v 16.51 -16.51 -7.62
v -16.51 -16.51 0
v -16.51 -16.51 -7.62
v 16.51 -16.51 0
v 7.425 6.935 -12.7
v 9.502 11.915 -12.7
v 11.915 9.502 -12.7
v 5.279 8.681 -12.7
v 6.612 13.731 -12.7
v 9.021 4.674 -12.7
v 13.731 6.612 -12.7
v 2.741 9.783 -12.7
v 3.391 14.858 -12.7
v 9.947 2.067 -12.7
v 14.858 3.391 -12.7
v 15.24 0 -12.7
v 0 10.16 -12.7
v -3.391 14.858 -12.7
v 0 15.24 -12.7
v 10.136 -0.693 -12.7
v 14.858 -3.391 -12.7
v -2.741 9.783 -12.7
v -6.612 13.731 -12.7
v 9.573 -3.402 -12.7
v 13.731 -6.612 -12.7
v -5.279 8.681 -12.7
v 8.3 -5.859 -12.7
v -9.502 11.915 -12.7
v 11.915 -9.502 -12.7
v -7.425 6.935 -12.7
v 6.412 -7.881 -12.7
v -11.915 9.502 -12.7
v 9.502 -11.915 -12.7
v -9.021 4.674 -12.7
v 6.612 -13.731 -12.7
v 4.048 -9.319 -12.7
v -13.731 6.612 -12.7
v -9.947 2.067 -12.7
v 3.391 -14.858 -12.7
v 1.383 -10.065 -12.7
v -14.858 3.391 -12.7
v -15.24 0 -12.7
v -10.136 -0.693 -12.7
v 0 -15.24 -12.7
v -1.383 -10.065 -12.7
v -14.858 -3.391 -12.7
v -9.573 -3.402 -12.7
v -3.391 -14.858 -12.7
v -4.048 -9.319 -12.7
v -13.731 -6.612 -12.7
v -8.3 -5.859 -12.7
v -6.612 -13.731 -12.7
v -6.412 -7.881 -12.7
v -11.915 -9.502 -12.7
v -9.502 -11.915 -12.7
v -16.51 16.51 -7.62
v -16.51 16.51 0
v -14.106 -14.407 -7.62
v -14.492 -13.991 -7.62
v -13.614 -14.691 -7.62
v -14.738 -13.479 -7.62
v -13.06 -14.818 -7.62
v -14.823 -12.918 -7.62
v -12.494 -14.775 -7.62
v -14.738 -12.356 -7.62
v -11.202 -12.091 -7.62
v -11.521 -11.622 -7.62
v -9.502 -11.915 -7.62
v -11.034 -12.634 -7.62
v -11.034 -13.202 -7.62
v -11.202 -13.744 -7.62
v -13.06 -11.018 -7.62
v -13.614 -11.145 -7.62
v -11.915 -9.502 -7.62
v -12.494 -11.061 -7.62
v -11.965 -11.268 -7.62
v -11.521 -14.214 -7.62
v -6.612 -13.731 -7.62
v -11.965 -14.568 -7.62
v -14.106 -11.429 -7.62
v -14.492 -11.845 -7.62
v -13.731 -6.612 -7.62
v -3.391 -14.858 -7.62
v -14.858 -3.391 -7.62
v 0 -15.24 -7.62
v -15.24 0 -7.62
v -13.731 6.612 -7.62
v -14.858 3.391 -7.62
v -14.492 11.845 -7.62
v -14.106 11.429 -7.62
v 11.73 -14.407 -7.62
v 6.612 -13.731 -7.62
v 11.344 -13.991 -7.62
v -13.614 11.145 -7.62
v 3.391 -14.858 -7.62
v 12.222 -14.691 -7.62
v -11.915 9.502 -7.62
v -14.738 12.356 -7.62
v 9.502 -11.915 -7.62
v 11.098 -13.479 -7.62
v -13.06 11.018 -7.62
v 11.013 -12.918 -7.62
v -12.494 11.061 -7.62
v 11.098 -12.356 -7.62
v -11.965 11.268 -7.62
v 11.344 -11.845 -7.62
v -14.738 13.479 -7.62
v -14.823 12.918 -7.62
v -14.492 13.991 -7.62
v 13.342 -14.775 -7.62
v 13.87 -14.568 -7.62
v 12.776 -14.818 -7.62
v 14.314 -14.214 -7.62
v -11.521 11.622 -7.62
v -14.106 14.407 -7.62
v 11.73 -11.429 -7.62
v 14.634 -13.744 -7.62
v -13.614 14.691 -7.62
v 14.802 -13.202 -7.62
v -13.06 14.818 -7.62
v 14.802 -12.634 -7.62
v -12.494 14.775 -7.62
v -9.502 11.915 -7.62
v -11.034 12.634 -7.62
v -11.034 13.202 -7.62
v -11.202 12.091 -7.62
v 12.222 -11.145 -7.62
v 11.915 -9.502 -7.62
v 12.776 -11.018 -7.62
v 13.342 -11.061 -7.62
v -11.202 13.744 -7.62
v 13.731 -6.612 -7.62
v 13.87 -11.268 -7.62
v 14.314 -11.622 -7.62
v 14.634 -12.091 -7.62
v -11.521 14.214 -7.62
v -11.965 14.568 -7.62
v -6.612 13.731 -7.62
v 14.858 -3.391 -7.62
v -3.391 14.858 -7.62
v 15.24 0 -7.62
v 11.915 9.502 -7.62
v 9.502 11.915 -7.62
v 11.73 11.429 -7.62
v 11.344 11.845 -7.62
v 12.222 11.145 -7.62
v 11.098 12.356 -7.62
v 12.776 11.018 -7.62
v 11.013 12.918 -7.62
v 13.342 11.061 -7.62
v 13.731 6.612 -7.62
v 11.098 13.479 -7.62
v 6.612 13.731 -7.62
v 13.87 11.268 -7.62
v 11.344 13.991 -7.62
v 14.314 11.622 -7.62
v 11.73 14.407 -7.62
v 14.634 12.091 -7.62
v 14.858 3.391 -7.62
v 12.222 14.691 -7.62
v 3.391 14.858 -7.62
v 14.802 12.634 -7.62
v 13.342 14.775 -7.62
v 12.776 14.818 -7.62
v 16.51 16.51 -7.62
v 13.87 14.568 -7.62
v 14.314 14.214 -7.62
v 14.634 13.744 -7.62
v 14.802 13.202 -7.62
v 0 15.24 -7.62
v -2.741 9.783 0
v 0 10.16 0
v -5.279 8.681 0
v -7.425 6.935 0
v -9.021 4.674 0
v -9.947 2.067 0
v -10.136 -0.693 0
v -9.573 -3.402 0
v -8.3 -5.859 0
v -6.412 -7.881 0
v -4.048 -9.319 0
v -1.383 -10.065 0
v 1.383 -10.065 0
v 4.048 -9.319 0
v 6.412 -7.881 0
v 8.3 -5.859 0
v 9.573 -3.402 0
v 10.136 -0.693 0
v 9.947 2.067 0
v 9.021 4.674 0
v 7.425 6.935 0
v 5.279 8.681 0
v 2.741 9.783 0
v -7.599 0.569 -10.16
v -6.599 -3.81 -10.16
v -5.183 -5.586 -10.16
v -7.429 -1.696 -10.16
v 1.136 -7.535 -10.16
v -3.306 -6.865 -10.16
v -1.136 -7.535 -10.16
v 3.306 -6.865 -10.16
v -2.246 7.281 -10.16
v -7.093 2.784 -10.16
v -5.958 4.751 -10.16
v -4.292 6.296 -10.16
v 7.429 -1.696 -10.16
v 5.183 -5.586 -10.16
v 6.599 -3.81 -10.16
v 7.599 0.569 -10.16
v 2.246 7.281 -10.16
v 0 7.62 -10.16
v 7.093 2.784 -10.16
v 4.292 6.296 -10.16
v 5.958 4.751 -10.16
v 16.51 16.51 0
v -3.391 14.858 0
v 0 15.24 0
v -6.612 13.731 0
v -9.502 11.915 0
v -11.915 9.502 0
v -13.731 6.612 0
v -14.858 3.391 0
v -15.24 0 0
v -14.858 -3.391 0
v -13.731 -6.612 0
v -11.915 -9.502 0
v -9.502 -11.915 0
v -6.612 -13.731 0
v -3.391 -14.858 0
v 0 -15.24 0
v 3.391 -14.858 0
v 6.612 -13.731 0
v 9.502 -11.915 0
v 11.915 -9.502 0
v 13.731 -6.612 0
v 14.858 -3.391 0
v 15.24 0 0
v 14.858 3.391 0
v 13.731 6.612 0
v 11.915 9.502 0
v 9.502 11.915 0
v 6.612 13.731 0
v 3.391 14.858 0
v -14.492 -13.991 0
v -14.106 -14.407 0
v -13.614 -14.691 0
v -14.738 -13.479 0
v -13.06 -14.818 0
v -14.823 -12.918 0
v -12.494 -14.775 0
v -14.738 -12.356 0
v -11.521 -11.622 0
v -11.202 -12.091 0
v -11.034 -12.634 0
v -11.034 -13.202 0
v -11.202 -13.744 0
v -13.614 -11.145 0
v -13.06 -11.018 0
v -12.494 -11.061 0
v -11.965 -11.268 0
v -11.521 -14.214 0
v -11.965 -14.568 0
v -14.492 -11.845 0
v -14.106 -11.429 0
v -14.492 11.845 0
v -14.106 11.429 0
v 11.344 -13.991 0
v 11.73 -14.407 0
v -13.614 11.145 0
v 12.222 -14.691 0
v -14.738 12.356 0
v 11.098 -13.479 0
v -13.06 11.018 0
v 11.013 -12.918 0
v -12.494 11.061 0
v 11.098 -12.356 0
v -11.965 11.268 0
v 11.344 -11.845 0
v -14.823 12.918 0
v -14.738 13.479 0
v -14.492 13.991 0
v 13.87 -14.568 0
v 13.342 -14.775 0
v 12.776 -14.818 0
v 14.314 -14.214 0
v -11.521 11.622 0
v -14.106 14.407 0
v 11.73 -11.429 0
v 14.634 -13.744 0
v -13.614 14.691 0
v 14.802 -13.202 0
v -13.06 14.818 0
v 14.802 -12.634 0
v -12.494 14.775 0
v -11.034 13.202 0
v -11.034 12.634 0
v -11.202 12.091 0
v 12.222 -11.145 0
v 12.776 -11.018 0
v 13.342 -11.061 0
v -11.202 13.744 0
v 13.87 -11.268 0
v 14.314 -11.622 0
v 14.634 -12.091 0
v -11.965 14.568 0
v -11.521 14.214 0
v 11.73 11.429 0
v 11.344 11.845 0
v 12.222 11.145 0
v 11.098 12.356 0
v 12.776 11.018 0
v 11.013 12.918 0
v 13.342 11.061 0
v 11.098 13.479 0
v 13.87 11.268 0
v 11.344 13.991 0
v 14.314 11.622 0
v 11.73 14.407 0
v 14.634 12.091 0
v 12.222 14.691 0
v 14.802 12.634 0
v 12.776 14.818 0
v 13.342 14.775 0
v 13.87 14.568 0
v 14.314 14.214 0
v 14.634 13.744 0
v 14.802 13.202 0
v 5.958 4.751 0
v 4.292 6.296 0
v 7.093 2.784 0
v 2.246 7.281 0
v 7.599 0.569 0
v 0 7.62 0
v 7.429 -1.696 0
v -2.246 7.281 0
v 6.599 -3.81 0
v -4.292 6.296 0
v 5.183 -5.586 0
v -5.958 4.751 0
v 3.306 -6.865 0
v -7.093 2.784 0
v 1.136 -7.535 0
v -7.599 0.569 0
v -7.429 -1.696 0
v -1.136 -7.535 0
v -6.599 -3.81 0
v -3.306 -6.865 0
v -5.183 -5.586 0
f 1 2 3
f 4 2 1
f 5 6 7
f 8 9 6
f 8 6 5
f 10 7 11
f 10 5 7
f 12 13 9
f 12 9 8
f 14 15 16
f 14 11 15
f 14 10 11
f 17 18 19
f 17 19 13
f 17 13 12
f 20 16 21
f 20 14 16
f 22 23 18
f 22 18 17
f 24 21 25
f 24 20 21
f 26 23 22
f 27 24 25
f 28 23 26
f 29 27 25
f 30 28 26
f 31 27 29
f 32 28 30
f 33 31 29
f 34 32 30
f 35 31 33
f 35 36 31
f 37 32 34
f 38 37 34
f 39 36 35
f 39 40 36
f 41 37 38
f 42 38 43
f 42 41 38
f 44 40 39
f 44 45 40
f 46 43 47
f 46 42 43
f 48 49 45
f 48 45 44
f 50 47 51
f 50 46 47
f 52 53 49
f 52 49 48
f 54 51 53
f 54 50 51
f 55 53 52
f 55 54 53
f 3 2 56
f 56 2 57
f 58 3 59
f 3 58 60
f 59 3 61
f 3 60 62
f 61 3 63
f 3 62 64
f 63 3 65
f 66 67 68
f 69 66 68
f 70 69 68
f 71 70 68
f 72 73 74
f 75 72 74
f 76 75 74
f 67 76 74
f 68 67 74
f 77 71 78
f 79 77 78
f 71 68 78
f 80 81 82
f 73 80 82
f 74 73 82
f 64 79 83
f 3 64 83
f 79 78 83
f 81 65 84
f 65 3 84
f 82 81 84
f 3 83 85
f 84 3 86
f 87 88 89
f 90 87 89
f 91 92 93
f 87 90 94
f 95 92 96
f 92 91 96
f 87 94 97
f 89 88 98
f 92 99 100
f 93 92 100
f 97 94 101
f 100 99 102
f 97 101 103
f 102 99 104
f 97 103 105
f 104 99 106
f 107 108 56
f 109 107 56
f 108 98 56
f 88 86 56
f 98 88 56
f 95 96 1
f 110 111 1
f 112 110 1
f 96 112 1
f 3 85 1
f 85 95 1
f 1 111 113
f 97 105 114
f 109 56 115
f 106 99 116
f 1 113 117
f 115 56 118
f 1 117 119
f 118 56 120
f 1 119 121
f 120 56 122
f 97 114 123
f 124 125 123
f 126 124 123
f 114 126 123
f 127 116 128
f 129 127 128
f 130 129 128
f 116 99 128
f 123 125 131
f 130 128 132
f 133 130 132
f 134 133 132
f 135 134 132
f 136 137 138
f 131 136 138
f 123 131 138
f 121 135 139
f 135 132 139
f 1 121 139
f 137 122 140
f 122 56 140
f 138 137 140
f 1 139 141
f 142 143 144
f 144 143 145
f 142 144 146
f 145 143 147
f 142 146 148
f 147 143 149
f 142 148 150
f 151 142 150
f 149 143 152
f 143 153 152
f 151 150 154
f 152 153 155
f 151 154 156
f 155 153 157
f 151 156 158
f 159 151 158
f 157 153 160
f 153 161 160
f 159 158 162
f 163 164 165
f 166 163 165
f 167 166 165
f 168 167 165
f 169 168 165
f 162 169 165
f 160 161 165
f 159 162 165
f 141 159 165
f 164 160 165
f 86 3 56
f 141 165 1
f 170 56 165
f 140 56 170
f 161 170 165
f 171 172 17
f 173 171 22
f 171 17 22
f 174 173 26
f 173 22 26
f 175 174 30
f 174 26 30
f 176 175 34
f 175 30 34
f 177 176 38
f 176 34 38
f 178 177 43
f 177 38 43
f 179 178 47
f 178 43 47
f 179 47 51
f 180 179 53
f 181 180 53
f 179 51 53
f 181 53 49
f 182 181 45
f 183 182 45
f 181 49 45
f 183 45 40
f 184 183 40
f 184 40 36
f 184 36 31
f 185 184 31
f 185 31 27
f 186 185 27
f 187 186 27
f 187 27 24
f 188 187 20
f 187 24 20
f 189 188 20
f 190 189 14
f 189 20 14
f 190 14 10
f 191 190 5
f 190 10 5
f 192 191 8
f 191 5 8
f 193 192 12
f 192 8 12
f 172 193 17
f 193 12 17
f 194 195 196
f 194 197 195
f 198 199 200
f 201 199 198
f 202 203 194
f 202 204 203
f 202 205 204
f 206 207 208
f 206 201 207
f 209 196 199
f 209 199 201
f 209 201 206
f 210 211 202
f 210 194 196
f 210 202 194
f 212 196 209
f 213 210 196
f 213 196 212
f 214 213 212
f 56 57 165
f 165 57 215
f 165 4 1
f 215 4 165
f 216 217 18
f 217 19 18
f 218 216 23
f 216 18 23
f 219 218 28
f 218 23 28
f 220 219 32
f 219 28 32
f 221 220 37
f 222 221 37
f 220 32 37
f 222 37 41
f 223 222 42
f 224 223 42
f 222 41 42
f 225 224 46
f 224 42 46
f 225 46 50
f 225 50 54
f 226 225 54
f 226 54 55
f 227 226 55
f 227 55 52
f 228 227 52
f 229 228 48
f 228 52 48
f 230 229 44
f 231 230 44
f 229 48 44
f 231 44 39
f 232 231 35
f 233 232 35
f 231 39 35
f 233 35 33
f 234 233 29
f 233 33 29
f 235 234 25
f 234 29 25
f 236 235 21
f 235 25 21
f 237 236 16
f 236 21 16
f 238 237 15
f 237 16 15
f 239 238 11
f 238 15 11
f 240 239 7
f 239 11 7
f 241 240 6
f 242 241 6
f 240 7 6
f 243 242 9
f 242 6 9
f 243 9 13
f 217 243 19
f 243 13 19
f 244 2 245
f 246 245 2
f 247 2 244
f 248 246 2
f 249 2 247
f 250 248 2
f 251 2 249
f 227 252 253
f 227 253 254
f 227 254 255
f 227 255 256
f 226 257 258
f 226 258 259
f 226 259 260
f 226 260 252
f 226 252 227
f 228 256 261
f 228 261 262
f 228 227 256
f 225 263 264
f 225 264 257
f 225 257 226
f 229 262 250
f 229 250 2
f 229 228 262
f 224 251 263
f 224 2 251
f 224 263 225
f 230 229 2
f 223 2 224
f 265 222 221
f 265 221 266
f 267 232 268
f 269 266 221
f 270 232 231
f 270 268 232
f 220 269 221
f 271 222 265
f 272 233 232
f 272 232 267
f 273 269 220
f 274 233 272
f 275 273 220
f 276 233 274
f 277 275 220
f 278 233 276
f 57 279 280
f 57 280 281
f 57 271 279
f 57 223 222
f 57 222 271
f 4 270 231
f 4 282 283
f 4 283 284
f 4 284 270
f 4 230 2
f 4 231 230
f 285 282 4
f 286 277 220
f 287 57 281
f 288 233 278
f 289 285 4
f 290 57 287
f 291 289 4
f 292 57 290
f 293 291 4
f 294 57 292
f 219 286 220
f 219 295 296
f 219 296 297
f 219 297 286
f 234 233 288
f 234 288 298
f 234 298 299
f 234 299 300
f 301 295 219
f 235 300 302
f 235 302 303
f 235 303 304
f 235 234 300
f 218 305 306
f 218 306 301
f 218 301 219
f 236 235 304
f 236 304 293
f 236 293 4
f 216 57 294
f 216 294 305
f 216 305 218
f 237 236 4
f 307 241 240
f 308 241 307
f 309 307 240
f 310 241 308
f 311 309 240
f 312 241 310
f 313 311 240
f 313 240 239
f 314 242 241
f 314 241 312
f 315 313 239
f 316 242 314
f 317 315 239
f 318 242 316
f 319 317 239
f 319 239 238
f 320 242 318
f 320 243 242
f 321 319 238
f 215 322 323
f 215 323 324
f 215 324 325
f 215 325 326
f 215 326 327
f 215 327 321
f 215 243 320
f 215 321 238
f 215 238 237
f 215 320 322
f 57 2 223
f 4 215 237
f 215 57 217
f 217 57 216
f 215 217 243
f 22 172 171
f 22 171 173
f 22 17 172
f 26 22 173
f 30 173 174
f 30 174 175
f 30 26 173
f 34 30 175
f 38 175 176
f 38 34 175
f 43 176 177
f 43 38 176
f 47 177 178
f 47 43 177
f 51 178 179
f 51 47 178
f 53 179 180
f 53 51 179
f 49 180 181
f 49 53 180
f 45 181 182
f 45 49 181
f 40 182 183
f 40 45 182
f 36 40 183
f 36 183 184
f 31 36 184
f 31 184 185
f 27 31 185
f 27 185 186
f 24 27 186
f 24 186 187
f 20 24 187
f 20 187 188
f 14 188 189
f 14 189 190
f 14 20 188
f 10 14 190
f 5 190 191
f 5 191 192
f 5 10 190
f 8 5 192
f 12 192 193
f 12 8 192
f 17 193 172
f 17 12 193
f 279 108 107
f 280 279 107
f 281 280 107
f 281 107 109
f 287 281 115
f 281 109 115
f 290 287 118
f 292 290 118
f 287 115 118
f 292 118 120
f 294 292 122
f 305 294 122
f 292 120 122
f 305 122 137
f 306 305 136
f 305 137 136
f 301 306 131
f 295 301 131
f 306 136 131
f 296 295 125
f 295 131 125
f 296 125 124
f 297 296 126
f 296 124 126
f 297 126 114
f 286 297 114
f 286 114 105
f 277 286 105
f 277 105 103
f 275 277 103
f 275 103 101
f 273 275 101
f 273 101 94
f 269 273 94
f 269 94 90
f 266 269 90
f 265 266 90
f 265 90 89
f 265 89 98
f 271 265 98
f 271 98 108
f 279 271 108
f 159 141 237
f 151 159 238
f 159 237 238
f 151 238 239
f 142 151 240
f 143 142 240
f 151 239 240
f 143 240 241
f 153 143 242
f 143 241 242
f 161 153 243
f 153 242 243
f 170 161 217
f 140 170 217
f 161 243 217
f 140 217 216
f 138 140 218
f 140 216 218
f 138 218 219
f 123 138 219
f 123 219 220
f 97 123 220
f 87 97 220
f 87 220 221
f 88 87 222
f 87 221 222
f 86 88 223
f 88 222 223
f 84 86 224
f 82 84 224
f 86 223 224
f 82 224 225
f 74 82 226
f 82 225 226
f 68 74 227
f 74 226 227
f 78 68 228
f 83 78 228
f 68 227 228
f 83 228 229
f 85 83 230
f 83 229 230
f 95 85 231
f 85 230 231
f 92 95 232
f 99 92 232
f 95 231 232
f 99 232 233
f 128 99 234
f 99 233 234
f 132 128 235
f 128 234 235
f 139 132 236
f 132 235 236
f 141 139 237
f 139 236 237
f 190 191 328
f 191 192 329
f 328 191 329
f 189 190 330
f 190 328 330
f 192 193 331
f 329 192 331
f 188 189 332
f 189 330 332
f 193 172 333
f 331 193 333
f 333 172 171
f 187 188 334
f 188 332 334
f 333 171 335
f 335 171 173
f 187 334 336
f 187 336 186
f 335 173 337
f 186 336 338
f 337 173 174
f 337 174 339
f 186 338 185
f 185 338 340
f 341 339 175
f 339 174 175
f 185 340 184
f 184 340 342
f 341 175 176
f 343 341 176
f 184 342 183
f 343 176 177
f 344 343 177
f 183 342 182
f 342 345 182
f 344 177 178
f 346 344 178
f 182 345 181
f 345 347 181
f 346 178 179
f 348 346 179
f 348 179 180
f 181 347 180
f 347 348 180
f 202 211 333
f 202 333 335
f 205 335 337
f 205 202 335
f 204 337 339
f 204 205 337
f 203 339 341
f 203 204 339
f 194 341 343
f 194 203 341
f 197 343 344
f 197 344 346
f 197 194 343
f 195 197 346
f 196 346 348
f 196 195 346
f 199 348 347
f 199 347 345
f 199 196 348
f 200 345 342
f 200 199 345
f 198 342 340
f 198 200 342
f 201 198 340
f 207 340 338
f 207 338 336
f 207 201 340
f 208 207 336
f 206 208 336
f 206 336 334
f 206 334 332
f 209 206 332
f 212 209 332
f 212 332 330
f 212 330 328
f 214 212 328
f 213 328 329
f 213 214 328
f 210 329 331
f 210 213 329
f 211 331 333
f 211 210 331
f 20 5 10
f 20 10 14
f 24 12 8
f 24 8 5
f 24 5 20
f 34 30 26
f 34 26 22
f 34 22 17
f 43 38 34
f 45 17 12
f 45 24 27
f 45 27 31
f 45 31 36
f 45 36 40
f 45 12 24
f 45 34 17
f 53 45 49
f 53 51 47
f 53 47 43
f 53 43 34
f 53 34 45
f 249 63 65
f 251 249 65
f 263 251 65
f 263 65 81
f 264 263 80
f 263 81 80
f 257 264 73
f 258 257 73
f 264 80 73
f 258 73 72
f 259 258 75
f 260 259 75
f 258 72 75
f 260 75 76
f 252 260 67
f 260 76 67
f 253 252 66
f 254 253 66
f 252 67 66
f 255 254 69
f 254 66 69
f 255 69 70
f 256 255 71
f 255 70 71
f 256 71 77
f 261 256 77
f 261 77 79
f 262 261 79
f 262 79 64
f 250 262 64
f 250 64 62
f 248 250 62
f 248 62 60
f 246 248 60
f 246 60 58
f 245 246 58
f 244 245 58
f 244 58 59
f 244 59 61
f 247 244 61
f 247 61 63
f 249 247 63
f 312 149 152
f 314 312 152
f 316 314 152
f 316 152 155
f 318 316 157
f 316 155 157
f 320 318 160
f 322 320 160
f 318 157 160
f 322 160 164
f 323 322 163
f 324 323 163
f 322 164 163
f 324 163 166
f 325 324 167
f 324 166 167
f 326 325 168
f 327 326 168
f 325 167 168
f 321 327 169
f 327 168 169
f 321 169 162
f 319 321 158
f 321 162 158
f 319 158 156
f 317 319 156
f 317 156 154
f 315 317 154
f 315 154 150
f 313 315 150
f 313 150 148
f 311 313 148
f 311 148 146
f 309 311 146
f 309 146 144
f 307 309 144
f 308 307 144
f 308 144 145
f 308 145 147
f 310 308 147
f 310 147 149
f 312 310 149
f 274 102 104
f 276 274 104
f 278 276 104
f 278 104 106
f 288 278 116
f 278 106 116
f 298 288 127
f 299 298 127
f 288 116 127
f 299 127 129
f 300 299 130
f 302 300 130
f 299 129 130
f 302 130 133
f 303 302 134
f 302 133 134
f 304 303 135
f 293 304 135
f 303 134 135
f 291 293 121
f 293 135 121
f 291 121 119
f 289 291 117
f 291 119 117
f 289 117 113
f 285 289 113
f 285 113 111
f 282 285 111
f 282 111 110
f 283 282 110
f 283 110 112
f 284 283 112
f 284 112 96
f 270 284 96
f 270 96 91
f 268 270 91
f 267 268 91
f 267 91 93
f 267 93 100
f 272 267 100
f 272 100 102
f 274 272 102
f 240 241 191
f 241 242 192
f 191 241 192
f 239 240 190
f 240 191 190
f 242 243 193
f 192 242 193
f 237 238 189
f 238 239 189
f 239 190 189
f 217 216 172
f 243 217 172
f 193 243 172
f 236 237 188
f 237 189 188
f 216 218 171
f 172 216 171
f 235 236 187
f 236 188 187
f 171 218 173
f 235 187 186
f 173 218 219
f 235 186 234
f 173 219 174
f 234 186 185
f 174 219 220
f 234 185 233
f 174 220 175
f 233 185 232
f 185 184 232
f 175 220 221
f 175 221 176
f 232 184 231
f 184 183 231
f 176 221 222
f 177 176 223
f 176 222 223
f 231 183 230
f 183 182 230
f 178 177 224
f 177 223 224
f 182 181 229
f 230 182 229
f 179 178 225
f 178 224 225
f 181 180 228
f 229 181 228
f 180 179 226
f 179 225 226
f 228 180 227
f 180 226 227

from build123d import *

# Parameters (mm, degrees)
SKETCH1_W           = 12.7
SKETCH1_H           = 5.08
SKETCH1_4_W         = 12.7
SKETCH1_4_H         = 2.54
SKETCH3_W           = 33.02
SKETCH3_H           = 33.02
SKETCH3_R           = 15.24
BOSS_EXTRUDE1_DEPTH = 7.62
SKETCH4_R           = 1.905
CUT_EXTRUDE2_DEPTH  = 8.62
BOSS_EXTRUDE3_START = -12.7
SKETCH5_R           = 10.16
BOSS_EXTRUDE3_DEPTH = 2.54


with BuildPart() as part:
    # Sketch1 → Revolve2 (revolve)
    with BuildSketch(Plane(origin=(0, 0, 0), x_dir=(0, 0, -1), z_dir=(1, 0, 0))):
        with Locations((6.35, 12.7)):
            Rectangle(SKETCH1_W, SKETCH1_H)
    revolve(axis=Axis((0, 0, -12.7), (0, 0, 1)))


with BuildPart() as body_2:
    # Sketch1<4> → Revolve3 (revolve)
    with BuildSketch(Plane(origin=(0, 0, 0), x_dir=(0, 0, -1), z_dir=(1, 0, 0))):
        with Locations((6.35, 8.89)):
            Rectangle(SKETCH1_4_W, SKETCH1_4_H)
    revolve(axis=Axis((0, 0, -12.7), (0, 0, 1)))


with BuildPart() as body_3:
    # Sketch3 → Boss-Extrude1 (new body)
    with BuildSketch(Plane.XY):
        Rectangle(SKETCH3_W, SKETCH3_H)
        Circle(SKETCH3_R, mode=Mode.SUBTRACT)
    extrude(amount=-BOSS_EXTRUDE1_DEPTH)

    # Sketch4 → Cut-Extrude2 (cut, through all)
    with BuildSketch(Plane(origin=(0, 0, -7.62), x_dir=(-1, 0, 0), z_dir=(0, 0, -1))):
        with Locations((-12.917897552, 12.917897552)):
            Circle(SKETCH4_R)
        with Locations((12.917897552, 12.917897552)):
            Circle(SKETCH4_R)
        with Locations((12.917897552, -12.917897552)):
            Circle(SKETCH4_R)
        with Locations((-12.917897552, -12.917897552)):
            Circle(SKETCH4_R)
    extrude(amount=-CUT_EXTRUDE2_DEPTH, mode=Mode.SUBTRACT)


with BuildPart() as body_4:
    # Sketch5 → Boss-Extrude3 (new body)
    with BuildSketch(Plane.XY.offset(BOSS_EXTRUDE3_START)):
        Circle(SKETCH5_R)
    extrude(amount=BOSS_EXTRUDE3_DEPTH)


with BuildPart() as body_2_1:
    add(body_2.part)

    # Combine1: union body 4
    add(body_4.part)


solid = Compound([part.part, body_3.part, body_2_1.part])
